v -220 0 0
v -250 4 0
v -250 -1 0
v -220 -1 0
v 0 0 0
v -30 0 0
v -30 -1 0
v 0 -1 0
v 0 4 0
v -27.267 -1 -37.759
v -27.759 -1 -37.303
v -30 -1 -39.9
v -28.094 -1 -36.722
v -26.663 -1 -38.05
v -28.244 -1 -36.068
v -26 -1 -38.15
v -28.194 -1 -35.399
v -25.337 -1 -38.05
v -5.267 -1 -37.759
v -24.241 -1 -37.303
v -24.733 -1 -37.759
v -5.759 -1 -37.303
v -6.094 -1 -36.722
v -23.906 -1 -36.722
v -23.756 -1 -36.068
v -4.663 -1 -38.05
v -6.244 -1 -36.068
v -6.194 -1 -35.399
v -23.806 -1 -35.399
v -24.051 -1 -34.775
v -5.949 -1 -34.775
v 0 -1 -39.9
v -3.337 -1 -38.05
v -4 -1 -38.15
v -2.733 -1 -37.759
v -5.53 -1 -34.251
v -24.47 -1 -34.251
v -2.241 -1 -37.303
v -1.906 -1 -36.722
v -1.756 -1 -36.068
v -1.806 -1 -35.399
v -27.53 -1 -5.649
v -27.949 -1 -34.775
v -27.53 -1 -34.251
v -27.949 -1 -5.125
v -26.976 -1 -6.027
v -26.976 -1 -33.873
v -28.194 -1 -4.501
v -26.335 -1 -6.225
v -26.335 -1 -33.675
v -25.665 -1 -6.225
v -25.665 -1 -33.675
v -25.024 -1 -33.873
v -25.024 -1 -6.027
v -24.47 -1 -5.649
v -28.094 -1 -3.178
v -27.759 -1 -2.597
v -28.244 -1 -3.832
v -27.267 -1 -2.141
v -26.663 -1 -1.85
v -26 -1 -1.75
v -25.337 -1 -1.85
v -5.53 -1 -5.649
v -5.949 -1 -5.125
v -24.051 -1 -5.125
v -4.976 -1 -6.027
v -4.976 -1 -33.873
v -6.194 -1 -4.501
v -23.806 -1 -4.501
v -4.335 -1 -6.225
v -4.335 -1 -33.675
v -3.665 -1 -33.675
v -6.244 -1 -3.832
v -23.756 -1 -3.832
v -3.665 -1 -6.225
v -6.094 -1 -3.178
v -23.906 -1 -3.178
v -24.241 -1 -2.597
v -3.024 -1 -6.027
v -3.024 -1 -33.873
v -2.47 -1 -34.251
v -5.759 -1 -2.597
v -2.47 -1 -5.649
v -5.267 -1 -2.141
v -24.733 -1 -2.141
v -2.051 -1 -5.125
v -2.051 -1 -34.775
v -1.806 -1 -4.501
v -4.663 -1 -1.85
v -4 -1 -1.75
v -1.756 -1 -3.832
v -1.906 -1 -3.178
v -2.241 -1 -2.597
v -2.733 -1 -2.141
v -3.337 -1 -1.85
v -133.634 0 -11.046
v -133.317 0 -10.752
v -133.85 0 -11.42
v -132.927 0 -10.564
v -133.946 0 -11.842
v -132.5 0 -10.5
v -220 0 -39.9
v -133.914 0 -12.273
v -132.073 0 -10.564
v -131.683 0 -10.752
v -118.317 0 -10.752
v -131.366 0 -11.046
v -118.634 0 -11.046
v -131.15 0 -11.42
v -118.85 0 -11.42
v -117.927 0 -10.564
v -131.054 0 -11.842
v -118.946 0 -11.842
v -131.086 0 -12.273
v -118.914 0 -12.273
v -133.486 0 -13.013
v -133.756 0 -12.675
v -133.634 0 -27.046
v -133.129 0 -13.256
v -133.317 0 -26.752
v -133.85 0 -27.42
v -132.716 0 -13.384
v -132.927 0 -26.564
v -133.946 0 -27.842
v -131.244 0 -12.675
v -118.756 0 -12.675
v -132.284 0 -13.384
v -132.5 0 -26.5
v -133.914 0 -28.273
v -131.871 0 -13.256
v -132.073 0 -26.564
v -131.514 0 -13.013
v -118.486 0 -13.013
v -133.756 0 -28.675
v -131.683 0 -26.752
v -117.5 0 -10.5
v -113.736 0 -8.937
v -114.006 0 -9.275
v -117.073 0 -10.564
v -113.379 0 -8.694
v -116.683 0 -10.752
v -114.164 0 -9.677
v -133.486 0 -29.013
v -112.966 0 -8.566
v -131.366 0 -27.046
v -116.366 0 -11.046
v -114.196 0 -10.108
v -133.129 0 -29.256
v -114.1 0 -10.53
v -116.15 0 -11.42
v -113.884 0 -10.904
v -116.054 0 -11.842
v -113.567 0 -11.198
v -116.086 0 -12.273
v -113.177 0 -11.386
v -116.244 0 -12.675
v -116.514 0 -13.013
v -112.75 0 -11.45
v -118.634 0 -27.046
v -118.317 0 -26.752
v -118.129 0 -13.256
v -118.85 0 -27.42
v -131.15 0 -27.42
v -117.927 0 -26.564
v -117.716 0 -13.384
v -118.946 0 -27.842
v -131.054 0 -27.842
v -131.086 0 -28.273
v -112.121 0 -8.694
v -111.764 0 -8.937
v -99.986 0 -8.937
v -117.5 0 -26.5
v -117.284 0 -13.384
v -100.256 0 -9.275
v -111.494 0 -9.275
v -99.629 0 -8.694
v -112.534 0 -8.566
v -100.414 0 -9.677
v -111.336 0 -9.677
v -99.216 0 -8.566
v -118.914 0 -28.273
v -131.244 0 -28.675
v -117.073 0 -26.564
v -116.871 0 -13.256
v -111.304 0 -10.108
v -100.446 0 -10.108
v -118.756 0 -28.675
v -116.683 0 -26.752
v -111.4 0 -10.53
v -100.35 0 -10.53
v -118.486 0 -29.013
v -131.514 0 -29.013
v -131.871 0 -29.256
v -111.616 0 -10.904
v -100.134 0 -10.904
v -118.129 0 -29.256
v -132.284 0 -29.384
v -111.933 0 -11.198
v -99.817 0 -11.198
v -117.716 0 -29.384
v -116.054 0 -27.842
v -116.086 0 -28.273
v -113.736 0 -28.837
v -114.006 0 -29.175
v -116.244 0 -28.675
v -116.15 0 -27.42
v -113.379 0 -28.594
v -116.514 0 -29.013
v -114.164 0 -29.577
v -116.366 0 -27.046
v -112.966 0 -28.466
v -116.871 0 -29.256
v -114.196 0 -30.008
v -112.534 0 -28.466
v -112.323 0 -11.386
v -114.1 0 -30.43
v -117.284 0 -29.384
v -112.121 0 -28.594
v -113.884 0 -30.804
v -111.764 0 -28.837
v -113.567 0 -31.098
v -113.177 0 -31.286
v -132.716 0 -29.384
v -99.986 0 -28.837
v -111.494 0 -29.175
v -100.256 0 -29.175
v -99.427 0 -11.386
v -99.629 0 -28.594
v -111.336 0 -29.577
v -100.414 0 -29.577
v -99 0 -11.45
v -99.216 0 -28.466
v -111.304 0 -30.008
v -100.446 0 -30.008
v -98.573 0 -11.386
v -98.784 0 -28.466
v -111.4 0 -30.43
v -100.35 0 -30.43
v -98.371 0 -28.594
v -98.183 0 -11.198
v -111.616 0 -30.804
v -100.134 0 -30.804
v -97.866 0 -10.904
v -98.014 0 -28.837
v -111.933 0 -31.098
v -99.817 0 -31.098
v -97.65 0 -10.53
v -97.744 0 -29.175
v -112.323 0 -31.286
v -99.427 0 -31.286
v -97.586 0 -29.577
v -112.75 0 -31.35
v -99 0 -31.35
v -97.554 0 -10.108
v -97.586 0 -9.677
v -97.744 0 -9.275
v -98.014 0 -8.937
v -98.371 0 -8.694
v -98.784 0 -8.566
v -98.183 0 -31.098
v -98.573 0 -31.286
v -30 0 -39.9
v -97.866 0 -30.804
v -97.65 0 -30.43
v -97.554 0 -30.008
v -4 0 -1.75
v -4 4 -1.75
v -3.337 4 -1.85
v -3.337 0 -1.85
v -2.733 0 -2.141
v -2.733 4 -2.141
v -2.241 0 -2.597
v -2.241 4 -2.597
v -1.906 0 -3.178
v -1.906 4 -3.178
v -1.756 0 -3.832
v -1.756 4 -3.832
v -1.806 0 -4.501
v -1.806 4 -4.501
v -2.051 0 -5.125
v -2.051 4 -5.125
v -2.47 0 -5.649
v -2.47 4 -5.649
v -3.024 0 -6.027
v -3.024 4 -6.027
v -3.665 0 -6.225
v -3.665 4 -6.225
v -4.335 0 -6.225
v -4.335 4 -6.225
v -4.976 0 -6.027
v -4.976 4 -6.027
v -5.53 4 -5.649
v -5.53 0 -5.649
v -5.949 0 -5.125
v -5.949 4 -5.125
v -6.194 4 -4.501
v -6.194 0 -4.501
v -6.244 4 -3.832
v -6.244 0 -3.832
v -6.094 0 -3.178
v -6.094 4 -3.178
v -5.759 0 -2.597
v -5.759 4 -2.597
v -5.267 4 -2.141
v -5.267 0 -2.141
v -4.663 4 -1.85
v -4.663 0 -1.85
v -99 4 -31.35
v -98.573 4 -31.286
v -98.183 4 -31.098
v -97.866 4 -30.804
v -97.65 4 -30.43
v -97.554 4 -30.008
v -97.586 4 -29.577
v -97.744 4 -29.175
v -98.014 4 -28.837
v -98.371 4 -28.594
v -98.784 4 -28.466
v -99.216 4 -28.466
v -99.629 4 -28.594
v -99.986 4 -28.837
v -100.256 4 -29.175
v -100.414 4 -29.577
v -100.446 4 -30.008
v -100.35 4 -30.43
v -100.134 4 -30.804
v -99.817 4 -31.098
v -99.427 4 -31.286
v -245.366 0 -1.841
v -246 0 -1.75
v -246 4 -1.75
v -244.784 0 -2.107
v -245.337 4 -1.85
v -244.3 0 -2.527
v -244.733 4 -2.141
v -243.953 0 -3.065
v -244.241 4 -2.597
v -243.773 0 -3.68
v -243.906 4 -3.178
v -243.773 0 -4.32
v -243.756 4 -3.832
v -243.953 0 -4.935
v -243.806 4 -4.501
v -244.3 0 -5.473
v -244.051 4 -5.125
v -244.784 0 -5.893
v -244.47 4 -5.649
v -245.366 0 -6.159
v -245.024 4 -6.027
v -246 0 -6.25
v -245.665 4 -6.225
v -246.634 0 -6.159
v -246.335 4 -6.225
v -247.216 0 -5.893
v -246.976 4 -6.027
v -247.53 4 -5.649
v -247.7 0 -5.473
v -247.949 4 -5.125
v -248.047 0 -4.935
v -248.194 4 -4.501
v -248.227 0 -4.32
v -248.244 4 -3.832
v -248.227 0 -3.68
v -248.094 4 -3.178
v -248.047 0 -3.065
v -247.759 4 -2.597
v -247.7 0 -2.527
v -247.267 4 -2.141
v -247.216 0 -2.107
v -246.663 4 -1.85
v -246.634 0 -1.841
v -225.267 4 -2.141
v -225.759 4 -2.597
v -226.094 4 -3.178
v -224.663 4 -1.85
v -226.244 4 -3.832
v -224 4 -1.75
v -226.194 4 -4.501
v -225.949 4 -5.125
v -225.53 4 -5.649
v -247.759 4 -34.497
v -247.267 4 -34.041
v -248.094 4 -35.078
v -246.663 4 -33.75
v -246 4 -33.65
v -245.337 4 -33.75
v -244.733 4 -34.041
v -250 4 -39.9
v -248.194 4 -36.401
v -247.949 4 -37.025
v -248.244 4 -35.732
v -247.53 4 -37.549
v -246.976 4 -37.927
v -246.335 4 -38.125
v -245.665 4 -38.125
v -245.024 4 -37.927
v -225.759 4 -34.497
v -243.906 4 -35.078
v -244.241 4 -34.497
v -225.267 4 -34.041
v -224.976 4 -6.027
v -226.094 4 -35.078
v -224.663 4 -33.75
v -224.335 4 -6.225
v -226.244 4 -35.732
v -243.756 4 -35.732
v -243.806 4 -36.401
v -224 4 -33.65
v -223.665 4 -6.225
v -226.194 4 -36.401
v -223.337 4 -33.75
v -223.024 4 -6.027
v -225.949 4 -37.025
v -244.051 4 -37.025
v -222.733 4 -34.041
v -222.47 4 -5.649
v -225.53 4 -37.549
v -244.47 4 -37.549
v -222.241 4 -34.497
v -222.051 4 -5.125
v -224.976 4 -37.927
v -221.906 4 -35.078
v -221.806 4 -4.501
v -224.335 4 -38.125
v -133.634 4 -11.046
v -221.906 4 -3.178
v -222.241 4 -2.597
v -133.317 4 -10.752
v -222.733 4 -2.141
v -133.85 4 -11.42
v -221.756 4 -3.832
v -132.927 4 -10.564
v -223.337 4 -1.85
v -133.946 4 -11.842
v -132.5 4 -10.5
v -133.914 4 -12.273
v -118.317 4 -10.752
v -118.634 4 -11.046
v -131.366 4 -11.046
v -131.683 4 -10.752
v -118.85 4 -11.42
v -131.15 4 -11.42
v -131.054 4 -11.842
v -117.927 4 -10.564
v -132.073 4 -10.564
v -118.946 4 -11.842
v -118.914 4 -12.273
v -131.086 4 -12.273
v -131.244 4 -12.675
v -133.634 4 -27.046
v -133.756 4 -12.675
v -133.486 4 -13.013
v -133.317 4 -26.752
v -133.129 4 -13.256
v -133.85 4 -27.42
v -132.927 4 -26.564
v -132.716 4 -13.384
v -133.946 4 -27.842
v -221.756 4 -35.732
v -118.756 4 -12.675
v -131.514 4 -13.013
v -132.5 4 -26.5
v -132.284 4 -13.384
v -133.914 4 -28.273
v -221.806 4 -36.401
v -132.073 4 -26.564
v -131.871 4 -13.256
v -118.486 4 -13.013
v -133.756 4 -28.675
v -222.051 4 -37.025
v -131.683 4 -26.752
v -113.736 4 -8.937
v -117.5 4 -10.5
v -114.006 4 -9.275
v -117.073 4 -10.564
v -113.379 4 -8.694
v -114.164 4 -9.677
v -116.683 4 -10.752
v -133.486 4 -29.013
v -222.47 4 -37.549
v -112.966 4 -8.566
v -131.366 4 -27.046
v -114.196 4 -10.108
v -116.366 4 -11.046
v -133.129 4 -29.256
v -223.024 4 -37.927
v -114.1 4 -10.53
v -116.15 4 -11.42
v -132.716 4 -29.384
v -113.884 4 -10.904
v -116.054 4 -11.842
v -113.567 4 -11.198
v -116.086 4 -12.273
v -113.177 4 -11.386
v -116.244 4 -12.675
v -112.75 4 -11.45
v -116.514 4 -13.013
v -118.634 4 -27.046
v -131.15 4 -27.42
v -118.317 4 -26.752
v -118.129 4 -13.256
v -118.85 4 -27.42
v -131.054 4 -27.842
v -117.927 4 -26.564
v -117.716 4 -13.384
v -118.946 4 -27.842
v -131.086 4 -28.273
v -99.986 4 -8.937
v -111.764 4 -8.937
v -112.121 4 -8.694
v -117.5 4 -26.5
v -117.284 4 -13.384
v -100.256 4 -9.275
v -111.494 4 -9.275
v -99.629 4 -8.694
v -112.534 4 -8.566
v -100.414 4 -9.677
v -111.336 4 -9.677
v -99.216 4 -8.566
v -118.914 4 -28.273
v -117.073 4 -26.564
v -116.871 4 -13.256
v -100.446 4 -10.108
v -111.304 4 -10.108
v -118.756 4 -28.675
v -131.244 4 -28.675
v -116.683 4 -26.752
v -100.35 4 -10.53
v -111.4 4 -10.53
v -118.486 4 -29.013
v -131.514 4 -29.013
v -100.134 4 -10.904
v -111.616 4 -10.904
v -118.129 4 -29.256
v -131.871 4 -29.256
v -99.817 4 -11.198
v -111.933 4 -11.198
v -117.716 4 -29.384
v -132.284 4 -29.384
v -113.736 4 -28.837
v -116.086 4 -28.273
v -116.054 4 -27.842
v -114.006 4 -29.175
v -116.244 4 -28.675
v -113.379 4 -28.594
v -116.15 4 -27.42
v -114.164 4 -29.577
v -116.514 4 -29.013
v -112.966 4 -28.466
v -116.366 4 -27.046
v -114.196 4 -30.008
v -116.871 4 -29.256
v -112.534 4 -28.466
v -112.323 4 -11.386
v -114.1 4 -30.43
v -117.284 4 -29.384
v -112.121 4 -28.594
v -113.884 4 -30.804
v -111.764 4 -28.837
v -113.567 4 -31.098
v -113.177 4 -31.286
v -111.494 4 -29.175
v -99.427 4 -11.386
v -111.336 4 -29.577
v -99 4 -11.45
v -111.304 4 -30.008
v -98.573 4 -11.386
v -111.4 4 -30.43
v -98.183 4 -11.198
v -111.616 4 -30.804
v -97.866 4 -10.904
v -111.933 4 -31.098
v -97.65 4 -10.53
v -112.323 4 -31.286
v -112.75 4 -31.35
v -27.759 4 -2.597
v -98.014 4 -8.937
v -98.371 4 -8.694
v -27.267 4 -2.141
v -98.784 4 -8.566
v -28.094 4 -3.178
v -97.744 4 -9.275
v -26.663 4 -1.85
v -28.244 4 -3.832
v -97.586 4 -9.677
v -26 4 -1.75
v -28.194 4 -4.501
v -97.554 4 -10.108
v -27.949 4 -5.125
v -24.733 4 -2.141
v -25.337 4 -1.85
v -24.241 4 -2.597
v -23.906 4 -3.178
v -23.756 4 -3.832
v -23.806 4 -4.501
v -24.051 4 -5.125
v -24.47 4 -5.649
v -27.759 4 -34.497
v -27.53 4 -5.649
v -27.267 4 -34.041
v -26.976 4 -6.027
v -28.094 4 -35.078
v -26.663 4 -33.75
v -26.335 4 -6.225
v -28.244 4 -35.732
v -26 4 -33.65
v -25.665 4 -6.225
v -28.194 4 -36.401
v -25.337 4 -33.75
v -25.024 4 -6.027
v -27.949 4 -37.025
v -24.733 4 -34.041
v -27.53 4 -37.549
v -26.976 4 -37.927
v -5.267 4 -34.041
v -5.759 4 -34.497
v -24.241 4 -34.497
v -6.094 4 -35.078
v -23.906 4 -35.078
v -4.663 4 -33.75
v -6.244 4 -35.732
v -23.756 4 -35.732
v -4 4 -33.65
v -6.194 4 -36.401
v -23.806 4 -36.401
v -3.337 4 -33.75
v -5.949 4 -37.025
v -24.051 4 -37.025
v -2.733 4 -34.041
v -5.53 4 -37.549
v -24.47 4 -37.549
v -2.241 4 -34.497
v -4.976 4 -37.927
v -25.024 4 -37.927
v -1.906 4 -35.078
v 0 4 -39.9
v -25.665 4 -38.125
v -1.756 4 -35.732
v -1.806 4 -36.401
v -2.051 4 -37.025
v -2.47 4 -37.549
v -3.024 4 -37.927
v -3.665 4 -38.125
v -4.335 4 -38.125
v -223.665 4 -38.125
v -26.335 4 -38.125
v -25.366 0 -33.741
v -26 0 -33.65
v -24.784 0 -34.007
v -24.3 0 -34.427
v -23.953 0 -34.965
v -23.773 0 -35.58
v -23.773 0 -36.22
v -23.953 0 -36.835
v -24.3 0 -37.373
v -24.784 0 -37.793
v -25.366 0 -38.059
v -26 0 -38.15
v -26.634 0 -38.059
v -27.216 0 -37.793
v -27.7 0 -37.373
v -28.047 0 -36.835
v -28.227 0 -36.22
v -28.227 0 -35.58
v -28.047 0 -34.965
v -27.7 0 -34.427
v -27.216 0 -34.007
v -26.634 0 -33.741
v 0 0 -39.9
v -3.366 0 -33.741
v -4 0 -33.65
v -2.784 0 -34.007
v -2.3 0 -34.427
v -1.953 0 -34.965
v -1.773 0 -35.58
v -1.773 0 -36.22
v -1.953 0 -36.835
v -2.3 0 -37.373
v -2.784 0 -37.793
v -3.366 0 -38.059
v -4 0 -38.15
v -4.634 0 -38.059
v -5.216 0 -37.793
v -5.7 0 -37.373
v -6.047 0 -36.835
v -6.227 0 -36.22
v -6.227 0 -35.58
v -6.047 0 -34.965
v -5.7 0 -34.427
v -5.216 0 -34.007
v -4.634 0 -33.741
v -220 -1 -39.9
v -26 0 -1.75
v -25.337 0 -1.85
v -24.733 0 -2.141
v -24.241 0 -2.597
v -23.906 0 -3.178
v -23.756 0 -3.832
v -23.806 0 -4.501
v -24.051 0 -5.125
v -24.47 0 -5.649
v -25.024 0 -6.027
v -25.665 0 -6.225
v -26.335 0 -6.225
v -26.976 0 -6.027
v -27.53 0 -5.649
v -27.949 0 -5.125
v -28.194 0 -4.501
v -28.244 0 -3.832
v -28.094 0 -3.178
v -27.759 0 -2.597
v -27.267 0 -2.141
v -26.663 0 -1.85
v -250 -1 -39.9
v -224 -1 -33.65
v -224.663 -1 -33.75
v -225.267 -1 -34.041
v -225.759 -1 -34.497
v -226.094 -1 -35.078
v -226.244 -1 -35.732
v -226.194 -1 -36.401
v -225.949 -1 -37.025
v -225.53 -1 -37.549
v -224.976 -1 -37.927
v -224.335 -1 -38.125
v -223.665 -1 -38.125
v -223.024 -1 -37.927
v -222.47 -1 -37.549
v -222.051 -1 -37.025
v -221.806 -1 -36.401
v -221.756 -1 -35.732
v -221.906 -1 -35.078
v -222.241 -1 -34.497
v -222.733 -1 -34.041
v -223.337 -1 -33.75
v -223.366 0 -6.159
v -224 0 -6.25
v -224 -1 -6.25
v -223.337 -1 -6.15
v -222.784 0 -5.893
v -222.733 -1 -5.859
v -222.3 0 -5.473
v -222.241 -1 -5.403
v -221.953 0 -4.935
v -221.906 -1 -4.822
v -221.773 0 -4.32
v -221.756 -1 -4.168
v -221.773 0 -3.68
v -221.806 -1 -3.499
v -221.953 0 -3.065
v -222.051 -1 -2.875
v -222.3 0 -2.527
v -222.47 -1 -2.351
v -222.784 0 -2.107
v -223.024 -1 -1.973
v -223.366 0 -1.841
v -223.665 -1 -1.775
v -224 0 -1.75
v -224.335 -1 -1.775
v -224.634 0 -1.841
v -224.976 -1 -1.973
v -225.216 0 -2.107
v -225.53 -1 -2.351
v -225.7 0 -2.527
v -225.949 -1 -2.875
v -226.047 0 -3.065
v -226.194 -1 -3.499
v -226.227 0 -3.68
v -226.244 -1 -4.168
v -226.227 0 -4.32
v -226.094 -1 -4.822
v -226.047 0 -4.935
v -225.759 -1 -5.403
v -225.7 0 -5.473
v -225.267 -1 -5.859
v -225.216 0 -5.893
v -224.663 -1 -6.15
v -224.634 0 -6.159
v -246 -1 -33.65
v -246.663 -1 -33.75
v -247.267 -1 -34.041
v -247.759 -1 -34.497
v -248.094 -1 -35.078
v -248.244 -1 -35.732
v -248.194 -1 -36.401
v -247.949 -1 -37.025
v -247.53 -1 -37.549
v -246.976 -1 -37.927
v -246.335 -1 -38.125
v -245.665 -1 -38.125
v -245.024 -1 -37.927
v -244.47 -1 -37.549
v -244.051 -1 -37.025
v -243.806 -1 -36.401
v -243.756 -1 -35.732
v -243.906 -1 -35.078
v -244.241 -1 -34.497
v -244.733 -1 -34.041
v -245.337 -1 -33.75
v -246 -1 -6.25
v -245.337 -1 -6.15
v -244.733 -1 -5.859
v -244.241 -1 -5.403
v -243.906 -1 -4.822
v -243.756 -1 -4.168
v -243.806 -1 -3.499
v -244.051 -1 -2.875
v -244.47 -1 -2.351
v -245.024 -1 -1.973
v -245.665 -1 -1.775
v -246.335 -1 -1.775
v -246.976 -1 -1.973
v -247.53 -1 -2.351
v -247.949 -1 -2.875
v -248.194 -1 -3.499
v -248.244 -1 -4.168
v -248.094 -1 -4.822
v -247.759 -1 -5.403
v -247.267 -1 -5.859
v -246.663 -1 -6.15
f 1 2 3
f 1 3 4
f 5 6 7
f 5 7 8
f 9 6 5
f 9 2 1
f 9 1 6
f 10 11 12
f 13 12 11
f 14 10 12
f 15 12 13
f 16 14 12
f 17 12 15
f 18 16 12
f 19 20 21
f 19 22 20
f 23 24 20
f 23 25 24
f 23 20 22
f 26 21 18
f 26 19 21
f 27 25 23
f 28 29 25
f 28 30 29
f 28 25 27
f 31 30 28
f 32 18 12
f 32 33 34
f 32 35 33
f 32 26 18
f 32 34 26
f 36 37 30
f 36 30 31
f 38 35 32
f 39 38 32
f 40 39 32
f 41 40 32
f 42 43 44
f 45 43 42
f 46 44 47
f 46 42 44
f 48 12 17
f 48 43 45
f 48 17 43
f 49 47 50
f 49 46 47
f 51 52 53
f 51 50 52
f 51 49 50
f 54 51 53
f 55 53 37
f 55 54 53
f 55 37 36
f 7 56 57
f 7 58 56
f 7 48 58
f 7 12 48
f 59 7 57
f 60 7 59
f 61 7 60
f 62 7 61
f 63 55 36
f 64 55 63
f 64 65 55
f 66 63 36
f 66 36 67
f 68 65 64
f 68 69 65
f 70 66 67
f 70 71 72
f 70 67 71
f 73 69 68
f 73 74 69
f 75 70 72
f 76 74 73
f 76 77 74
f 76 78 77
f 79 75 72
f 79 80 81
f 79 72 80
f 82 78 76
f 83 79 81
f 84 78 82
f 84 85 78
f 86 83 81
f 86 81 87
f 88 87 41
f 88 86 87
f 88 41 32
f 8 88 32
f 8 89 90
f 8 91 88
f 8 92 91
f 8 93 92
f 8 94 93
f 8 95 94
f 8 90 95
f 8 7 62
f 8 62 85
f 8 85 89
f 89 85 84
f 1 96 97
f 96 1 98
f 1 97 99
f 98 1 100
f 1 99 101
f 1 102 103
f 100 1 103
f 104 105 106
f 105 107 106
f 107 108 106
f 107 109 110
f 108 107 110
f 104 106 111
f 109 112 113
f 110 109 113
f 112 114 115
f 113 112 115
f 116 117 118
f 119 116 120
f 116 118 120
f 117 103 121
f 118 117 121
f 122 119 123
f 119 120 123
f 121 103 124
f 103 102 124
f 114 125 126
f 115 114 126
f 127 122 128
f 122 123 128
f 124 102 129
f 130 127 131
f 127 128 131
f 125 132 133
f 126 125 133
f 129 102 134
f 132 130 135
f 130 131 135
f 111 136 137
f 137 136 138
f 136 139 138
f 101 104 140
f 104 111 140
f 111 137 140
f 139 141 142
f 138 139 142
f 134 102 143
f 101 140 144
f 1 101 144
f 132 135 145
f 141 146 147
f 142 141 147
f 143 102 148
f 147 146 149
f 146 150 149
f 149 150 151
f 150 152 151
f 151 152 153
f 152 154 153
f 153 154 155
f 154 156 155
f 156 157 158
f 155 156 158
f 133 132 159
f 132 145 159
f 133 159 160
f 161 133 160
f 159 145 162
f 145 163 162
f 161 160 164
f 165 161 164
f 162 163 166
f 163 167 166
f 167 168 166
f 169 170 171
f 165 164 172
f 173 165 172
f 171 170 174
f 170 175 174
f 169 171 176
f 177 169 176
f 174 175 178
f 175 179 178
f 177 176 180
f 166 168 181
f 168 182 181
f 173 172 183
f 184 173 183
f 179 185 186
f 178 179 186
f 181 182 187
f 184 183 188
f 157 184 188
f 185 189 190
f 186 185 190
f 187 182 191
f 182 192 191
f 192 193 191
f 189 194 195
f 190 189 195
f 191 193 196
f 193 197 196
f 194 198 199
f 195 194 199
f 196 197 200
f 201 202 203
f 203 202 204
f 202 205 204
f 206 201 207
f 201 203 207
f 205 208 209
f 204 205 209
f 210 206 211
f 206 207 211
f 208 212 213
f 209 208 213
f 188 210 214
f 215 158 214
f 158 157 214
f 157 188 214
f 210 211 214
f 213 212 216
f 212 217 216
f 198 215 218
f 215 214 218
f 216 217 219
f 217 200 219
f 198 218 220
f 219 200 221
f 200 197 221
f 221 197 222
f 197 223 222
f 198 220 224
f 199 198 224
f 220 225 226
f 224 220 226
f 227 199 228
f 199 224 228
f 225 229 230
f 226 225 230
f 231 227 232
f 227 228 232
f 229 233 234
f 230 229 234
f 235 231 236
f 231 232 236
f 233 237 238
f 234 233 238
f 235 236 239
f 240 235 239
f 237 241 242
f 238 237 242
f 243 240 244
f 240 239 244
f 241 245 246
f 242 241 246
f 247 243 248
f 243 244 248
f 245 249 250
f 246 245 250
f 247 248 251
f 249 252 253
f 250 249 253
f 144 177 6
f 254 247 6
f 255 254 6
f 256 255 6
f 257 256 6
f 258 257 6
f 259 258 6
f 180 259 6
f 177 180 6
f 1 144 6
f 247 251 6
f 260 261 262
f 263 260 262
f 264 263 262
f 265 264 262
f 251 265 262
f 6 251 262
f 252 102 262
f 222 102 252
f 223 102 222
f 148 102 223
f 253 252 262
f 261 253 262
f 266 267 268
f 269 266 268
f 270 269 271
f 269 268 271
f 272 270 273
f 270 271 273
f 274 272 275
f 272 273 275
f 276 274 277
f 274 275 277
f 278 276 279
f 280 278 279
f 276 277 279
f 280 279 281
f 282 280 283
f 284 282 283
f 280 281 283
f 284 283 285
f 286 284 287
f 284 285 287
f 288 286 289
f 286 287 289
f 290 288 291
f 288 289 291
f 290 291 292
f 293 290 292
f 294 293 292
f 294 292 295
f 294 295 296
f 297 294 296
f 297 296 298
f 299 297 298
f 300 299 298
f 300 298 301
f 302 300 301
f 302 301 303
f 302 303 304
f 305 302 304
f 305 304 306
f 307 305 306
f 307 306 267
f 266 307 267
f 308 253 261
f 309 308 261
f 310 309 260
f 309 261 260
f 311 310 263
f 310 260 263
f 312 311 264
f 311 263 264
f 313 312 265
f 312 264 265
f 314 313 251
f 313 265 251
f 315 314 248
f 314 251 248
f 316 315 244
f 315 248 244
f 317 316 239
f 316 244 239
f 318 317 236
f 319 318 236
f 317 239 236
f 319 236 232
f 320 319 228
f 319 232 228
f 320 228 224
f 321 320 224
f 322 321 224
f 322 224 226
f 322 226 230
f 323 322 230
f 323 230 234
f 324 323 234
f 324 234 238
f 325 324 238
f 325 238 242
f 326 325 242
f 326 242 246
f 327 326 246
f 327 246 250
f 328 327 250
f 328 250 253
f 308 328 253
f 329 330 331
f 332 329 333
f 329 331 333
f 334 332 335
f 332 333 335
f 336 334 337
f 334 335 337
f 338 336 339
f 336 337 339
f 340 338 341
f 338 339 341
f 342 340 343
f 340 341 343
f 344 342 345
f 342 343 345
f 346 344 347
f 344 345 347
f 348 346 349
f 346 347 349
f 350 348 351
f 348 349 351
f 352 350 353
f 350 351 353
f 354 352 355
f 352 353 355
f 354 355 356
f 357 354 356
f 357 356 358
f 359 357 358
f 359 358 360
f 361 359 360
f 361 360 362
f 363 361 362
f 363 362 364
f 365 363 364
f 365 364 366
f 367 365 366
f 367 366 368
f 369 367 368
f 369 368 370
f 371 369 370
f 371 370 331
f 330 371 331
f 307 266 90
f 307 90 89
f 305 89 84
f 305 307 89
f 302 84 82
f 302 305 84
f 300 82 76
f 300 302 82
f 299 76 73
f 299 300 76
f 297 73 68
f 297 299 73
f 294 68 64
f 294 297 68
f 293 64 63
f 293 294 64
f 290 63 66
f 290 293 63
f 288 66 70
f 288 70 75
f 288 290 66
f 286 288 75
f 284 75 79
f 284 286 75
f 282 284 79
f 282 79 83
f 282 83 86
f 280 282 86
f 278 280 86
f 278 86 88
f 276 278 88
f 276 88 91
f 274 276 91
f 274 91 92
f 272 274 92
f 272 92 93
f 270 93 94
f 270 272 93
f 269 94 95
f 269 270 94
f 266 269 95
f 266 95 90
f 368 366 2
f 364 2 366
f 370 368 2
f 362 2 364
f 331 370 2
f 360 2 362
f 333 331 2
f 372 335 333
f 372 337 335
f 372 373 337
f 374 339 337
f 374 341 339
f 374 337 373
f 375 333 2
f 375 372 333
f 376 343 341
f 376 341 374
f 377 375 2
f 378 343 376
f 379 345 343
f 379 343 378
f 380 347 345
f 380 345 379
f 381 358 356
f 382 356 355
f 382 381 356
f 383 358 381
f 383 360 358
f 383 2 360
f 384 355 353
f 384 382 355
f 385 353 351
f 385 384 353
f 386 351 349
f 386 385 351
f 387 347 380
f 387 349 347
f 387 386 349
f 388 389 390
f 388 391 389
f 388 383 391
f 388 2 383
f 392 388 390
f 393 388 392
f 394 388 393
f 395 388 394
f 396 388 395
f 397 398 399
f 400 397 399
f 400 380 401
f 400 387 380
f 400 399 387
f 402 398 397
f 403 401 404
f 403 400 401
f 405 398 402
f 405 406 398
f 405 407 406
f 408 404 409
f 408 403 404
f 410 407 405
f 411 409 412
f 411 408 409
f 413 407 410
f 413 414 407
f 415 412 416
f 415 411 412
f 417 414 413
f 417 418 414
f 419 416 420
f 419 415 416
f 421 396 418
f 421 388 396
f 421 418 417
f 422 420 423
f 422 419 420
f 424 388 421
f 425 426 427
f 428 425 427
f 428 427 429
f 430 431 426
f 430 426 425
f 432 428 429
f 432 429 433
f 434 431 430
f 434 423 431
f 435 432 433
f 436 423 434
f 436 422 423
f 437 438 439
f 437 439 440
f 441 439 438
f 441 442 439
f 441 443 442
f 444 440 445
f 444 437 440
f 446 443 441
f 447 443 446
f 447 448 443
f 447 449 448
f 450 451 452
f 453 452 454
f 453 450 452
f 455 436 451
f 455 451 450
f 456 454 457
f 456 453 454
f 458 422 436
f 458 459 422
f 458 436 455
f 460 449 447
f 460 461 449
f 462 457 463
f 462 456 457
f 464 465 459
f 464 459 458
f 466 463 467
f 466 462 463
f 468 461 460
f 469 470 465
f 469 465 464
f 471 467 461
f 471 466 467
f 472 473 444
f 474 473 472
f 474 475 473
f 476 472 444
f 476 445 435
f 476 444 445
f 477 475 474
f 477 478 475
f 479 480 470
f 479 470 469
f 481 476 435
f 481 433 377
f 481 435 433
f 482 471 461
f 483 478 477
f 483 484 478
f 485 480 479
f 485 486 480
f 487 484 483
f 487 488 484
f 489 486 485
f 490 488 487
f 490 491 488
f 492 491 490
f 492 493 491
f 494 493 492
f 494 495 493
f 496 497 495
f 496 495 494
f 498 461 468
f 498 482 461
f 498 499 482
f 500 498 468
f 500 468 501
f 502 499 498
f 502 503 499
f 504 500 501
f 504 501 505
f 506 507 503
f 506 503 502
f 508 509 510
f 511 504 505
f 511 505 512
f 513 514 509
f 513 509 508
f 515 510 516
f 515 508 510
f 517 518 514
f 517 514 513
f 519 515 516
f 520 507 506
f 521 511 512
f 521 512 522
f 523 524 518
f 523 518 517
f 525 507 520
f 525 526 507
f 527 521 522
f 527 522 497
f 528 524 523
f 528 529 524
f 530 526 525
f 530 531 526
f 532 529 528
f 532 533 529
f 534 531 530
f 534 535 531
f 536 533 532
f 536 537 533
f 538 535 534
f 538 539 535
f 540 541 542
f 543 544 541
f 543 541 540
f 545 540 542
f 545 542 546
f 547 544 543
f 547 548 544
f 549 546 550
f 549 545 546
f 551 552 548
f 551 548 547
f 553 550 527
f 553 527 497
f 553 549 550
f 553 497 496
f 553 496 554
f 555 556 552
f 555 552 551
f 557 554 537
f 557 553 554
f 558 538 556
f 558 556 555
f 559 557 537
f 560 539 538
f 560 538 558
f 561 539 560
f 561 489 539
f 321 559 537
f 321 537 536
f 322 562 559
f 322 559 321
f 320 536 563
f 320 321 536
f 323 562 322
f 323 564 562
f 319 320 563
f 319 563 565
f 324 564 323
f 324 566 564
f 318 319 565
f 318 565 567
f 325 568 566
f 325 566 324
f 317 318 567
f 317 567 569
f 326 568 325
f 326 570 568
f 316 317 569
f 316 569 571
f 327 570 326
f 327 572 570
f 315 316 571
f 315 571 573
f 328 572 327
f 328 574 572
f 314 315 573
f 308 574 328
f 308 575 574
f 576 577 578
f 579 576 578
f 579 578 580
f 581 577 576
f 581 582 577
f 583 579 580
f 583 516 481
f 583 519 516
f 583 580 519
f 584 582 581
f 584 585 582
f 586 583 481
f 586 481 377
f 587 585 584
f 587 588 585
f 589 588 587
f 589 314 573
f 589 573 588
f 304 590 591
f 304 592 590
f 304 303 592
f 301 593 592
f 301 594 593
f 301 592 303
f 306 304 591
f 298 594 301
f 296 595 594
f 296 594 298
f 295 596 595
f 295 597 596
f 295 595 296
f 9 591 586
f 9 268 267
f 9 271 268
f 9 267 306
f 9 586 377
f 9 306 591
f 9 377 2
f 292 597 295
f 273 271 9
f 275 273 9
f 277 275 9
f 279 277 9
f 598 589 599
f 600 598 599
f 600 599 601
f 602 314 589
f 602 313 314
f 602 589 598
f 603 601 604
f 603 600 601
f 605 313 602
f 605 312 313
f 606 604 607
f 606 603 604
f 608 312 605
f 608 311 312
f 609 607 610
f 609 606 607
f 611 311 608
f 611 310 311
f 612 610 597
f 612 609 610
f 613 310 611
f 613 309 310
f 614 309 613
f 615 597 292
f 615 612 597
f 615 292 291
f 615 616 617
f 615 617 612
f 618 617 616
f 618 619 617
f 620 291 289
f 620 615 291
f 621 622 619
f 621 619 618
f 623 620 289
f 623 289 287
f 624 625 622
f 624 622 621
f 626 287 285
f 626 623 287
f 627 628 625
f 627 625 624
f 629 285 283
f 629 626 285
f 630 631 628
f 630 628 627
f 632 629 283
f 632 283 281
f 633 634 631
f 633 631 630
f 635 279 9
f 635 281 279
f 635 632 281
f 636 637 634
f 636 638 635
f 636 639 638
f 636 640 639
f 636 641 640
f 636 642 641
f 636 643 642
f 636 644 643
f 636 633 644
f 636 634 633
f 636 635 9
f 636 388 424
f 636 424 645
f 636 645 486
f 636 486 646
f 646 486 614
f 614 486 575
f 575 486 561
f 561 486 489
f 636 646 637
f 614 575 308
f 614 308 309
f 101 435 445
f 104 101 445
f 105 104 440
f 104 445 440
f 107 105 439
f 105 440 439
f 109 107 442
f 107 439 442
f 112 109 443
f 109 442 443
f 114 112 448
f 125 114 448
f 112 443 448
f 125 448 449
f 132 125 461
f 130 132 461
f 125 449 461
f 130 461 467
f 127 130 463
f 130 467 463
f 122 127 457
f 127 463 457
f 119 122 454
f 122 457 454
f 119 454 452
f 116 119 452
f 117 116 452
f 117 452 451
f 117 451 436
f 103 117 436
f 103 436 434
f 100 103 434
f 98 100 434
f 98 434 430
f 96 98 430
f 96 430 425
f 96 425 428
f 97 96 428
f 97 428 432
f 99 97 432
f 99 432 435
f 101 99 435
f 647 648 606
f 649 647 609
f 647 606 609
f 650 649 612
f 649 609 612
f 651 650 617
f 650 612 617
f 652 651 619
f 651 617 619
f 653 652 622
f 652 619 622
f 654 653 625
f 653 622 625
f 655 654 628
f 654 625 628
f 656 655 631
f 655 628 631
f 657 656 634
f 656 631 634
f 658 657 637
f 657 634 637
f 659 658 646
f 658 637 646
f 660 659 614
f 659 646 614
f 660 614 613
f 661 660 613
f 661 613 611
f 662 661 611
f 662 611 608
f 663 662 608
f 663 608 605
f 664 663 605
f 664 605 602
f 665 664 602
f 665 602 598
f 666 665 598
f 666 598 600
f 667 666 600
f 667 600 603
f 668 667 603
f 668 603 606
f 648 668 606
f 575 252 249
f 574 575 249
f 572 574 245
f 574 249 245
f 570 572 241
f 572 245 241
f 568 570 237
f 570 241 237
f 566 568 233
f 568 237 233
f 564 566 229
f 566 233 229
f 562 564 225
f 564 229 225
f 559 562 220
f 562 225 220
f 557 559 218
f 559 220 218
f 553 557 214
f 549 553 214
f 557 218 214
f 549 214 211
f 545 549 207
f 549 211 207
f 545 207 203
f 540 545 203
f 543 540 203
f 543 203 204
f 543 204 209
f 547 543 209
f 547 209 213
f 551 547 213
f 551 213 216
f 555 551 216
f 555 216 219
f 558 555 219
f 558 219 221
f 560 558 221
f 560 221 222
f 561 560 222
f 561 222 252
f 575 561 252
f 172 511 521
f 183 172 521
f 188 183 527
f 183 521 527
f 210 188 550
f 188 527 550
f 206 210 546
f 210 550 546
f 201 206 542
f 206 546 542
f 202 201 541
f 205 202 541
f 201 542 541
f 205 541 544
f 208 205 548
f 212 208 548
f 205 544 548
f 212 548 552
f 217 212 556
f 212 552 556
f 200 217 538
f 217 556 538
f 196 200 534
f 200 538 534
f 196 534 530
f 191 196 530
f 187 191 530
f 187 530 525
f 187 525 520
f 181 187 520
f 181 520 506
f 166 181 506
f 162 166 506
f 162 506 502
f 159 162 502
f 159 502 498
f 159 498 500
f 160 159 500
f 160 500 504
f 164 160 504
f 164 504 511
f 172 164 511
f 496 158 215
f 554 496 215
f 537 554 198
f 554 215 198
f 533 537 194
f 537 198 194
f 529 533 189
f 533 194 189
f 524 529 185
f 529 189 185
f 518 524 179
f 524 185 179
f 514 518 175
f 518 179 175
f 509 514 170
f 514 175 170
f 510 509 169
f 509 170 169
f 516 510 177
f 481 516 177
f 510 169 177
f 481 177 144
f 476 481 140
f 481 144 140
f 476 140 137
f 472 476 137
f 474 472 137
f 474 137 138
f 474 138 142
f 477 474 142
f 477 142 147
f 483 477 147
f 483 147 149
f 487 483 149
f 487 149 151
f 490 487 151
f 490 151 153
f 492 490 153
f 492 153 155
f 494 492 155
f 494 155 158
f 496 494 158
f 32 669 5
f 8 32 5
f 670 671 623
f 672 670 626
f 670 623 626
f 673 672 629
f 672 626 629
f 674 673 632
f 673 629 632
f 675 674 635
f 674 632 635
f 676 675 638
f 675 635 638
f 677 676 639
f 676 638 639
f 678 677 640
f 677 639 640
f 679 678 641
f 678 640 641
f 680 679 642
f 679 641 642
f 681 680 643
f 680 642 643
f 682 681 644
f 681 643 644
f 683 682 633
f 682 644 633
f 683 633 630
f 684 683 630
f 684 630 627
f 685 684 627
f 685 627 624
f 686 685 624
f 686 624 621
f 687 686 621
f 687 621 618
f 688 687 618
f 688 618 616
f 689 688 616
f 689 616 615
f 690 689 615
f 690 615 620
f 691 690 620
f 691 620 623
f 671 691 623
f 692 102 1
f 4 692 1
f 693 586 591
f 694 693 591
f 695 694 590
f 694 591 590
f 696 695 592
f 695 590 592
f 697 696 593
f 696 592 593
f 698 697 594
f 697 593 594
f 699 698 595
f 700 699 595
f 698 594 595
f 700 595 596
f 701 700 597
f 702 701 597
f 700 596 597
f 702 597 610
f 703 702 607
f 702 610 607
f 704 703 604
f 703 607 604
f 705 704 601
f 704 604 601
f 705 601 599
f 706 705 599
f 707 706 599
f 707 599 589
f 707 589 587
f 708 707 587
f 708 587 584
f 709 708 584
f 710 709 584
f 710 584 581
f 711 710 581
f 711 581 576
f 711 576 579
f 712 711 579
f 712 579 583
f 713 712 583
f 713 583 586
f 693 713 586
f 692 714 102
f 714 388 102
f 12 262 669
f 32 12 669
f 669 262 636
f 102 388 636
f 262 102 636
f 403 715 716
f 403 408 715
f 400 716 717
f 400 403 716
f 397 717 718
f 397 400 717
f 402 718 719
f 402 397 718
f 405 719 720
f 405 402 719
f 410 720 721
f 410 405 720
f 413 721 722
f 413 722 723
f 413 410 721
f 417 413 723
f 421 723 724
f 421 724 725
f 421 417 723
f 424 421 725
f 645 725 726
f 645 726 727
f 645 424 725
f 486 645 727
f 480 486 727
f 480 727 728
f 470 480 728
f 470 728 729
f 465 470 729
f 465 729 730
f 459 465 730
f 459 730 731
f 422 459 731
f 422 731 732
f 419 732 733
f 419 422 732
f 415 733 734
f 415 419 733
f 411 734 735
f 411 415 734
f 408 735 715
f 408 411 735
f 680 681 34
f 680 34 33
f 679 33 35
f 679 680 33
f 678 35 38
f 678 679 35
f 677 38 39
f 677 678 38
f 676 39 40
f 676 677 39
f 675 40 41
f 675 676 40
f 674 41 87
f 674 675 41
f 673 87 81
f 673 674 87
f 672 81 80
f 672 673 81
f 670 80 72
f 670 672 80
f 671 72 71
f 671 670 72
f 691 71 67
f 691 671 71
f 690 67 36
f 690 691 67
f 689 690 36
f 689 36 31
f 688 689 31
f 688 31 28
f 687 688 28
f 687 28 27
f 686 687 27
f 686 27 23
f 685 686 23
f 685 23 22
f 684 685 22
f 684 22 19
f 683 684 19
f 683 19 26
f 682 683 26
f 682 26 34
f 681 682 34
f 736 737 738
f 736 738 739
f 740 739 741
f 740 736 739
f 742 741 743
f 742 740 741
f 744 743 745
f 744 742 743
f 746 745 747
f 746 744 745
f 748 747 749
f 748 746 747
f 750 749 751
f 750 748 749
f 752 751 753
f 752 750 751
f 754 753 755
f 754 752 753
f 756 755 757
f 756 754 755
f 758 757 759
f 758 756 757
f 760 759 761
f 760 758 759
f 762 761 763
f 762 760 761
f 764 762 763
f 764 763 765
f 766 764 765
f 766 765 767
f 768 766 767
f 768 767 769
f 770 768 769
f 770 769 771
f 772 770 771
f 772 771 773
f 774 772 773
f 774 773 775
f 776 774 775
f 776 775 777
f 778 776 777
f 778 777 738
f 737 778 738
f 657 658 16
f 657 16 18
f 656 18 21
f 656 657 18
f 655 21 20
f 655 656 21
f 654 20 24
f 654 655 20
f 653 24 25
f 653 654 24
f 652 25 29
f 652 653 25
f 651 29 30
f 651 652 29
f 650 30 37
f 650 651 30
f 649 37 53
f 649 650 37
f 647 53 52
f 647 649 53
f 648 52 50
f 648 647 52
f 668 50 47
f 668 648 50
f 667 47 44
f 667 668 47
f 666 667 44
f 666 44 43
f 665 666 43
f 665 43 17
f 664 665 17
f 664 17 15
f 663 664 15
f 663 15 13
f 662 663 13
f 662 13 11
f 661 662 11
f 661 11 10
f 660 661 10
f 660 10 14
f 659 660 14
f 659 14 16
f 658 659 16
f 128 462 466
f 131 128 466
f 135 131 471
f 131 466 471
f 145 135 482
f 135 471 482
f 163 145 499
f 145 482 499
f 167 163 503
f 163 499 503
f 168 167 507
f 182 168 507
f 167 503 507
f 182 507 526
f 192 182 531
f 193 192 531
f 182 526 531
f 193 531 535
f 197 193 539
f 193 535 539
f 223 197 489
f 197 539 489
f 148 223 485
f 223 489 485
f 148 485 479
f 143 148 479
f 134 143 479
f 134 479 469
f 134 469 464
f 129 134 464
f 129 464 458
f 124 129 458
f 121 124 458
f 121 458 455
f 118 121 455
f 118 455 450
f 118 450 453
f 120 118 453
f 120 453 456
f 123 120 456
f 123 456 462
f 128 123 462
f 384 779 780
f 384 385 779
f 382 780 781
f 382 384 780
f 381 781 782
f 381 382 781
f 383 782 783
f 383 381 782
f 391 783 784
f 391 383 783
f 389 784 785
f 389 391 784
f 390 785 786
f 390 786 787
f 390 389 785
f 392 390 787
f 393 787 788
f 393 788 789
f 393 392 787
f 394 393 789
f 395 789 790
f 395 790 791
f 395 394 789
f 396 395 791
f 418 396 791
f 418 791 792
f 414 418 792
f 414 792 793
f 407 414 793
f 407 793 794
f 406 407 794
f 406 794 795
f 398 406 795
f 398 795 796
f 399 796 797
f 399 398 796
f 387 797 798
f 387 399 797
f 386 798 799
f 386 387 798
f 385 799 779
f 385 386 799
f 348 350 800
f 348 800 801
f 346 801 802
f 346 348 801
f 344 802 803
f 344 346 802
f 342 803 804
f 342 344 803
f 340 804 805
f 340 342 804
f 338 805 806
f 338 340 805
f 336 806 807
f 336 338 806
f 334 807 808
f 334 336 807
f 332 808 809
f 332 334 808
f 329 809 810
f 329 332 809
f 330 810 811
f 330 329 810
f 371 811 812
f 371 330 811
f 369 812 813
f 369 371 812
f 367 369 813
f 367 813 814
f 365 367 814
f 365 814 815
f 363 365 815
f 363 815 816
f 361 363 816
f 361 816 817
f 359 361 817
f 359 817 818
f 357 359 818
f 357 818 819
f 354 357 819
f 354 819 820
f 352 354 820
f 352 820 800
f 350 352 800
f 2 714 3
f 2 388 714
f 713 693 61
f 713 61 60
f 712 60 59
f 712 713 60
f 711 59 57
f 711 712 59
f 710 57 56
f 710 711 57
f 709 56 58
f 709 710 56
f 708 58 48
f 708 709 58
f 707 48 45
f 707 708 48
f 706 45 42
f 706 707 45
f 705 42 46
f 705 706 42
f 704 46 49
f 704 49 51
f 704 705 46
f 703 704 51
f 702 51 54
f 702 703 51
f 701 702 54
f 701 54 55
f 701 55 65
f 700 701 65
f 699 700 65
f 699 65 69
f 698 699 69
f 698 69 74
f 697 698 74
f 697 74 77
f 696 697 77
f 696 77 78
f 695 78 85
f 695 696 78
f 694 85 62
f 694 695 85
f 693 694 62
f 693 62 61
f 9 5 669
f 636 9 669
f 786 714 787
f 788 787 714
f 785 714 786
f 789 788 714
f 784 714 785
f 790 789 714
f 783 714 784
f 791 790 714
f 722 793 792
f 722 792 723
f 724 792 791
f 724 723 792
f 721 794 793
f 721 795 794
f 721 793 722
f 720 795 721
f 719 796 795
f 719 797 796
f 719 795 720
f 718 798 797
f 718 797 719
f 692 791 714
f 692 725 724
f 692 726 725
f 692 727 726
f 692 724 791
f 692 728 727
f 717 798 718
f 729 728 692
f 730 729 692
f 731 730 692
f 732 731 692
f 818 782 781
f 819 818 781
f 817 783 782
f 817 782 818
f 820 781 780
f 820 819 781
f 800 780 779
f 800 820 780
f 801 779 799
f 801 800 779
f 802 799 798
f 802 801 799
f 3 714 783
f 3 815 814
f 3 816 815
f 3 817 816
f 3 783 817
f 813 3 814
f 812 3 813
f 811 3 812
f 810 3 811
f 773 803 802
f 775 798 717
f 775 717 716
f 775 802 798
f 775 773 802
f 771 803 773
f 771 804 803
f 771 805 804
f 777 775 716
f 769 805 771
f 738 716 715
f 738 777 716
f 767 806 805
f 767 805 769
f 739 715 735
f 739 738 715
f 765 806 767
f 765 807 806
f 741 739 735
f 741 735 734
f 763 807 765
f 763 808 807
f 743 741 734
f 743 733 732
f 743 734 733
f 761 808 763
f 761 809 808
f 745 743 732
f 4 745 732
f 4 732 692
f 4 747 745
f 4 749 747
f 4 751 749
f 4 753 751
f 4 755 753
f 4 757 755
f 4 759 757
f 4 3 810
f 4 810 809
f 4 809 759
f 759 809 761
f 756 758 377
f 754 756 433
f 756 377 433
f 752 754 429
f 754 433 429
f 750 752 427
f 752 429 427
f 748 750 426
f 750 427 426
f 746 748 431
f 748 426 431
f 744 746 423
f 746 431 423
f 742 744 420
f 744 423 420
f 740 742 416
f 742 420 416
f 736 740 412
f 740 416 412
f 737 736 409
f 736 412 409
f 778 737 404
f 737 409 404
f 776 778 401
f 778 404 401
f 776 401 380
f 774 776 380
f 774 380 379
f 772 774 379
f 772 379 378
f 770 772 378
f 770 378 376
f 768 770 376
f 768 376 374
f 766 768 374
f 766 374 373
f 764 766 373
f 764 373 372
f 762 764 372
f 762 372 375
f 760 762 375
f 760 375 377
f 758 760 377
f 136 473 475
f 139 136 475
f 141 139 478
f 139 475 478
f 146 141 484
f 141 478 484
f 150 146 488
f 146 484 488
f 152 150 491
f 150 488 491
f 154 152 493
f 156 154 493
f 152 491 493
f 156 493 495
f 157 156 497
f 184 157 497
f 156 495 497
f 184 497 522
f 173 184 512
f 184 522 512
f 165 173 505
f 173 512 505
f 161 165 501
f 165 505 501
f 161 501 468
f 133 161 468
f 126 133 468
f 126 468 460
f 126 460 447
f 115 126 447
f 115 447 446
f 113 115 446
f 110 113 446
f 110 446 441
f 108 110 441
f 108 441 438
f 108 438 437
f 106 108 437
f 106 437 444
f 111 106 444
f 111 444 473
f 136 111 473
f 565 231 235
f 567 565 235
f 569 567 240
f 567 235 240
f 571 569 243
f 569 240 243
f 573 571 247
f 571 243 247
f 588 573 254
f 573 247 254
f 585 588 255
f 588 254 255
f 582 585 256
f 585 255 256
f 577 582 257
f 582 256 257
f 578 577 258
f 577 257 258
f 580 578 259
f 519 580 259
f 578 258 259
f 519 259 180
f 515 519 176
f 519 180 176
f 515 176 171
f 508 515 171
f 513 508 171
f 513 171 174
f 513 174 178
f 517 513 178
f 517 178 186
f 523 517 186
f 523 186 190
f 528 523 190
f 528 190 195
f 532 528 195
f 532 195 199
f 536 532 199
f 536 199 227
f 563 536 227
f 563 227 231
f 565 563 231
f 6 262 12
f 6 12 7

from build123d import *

# Parameters (mm, degrees)
SKETCH_1_W          = 250
SKETCH_1_H          = 39.9
EXTRUDE_1_DEPTH     = 4
SKETCH_2_R          = 1.45
CUT_EXTRUDE_1_DEPTH = 12
SKETCH_3_R          = 1.45
CUT_EXTRUDE_2_DEPTH = 12
SKETCH_7_R          = 2.25
CUT_EXTRUDE_6_DEPTH = 20
SKETCH_8_W          = 30
SKETCH_8_H          = 39.9
SKETCH_8_R          = 2.25
EXTRUDE_2_DEPTH     = 1


with BuildPart() as part:
    # 草图1 → 凸台-拉伸1 (new body)
    with BuildSketch(Plane(origin=(0, 0, 0), x_dir=(1, 0, 0), z_dir=(0, 1, 0))):
        with Locations((-125, 19.95)):
            Rectangle(SKETCH_1_W, SKETCH_1_H)
    extrude(amount=EXTRUDE_1_DEPTH)

    # 草图2 → 切除-拉伸1 (cut)
    with BuildSketch(Plane(origin=(0, 4, 0), x_dir=(1, 0, 0), z_dir=(0, 1, 0))):
        with Locations((-132.5, 27.95)):
            Circle(SKETCH_2_R)
        with Locations((-117.5, 27.95)):
            Circle(SKETCH_2_R)
        with Locations((-117.5, 11.95)):
            Circle(SKETCH_2_R)
        with Locations((-132.5, 11.95)):
            Circle(SKETCH_2_R)
    extrude(amount=-CUT_EXTRUDE_1_DEPTH, mode=Mode.SUBTRACT)

    # 草图3 → 切除-拉伸2 (cut)
    with BuildSketch(Plane(origin=(-275.091791604, 0, 105.376222054), x_dir=(-0.9999983055135633, 0, 0.0018409155336922224), z_dir=(0, -1, 0))):
        with Locations((-162.553914397, 115.077169025)):
            Circle(SKETCH_3_R)
        with Locations((-162.590548616, 134.977135305)):
            Circle(SKETCH_3_R)
        with Locations((-176.303891098, 115.051856436)):
            Circle(SKETCH_3_R)
        with Locations((-176.340525317, 134.951822716)):
            Circle(SKETCH_3_R)
    extrude(amount=-CUT_EXTRUDE_2_DEPTH, mode=Mode.SUBTRACT)

    # 草图7 → 切除-拉伸6 (cut)
    with BuildSketch(Plane(origin=(0, 4, 0), x_dir=(1, 0, 0), z_dir=(0, 1, 0))):
        with Locations((-246, 35.9)):
            Circle(SKETCH_7_R)
        with Locations((-224, 35.9)):
            Circle(SKETCH_7_R)
        with Locations((-224, 4)):
            Circle(SKETCH_7_R)
        with Locations((-246, 4)):
            Circle(SKETCH_7_R)
        with Locations((-4, 4)):
            Circle(SKETCH_7_R)
        with Locations((-26, 4)):
            Circle(SKETCH_7_R)
        with Locations((-26, 35.9)):
            Circle(SKETCH_7_R)
        with Locations((-4, 35.9)):
            Circle(SKETCH_7_R)
    extrude(amount=-CUT_EXTRUDE_6_DEPTH, mode=Mode.SUBTRACT)

    # 草图8 → 凸台-拉伸2 (add)
    # profile 1 of 2: a face of its own
    with BuildSketch(Plane.XZ):
        with Locations((-235, -19.95)):
            Rectangle(SKETCH_8_W, SKETCH_8_H)
        with Locations((-224, -35.9)):
            Circle(SKETCH_8_R, mode=Mode.SUBTRACT)
        with Locations((-246, -35.9)):
            Circle(SKETCH_8_R, mode=Mode.SUBTRACT)
        with Locations((-224, -4)):
            Circle(SKETCH_8_R, mode=Mode.SUBTRACT)
        with Locations((-246, -4)):
            Circle(SKETCH_8_R, mode=Mode.SUBTRACT)
    # profile 2 of 2: a face of its own
    with BuildSketch(Plane.XZ):
        with Locations((-15, -19.95)):
            Rectangle(SKETCH_8_W, SKETCH_8_H)
        with Locations((-4, -35.9)):
            Circle(SKETCH_8_R, mode=Mode.SUBTRACT)
        with Locations((-26, -35.9)):
            Circle(SKETCH_8_R, mode=Mode.SUBTRACT)
        with Locations((-4, -4)):
            Circle(SKETCH_8_R, mode=Mode.SUBTRACT)
        with Locations((-26, -4)):
            Circle(SKETCH_8_R, mode=Mode.SUBTRACT)
    extrude(amount=EXTRUDE_2_DEPTH)


solid = part.part
